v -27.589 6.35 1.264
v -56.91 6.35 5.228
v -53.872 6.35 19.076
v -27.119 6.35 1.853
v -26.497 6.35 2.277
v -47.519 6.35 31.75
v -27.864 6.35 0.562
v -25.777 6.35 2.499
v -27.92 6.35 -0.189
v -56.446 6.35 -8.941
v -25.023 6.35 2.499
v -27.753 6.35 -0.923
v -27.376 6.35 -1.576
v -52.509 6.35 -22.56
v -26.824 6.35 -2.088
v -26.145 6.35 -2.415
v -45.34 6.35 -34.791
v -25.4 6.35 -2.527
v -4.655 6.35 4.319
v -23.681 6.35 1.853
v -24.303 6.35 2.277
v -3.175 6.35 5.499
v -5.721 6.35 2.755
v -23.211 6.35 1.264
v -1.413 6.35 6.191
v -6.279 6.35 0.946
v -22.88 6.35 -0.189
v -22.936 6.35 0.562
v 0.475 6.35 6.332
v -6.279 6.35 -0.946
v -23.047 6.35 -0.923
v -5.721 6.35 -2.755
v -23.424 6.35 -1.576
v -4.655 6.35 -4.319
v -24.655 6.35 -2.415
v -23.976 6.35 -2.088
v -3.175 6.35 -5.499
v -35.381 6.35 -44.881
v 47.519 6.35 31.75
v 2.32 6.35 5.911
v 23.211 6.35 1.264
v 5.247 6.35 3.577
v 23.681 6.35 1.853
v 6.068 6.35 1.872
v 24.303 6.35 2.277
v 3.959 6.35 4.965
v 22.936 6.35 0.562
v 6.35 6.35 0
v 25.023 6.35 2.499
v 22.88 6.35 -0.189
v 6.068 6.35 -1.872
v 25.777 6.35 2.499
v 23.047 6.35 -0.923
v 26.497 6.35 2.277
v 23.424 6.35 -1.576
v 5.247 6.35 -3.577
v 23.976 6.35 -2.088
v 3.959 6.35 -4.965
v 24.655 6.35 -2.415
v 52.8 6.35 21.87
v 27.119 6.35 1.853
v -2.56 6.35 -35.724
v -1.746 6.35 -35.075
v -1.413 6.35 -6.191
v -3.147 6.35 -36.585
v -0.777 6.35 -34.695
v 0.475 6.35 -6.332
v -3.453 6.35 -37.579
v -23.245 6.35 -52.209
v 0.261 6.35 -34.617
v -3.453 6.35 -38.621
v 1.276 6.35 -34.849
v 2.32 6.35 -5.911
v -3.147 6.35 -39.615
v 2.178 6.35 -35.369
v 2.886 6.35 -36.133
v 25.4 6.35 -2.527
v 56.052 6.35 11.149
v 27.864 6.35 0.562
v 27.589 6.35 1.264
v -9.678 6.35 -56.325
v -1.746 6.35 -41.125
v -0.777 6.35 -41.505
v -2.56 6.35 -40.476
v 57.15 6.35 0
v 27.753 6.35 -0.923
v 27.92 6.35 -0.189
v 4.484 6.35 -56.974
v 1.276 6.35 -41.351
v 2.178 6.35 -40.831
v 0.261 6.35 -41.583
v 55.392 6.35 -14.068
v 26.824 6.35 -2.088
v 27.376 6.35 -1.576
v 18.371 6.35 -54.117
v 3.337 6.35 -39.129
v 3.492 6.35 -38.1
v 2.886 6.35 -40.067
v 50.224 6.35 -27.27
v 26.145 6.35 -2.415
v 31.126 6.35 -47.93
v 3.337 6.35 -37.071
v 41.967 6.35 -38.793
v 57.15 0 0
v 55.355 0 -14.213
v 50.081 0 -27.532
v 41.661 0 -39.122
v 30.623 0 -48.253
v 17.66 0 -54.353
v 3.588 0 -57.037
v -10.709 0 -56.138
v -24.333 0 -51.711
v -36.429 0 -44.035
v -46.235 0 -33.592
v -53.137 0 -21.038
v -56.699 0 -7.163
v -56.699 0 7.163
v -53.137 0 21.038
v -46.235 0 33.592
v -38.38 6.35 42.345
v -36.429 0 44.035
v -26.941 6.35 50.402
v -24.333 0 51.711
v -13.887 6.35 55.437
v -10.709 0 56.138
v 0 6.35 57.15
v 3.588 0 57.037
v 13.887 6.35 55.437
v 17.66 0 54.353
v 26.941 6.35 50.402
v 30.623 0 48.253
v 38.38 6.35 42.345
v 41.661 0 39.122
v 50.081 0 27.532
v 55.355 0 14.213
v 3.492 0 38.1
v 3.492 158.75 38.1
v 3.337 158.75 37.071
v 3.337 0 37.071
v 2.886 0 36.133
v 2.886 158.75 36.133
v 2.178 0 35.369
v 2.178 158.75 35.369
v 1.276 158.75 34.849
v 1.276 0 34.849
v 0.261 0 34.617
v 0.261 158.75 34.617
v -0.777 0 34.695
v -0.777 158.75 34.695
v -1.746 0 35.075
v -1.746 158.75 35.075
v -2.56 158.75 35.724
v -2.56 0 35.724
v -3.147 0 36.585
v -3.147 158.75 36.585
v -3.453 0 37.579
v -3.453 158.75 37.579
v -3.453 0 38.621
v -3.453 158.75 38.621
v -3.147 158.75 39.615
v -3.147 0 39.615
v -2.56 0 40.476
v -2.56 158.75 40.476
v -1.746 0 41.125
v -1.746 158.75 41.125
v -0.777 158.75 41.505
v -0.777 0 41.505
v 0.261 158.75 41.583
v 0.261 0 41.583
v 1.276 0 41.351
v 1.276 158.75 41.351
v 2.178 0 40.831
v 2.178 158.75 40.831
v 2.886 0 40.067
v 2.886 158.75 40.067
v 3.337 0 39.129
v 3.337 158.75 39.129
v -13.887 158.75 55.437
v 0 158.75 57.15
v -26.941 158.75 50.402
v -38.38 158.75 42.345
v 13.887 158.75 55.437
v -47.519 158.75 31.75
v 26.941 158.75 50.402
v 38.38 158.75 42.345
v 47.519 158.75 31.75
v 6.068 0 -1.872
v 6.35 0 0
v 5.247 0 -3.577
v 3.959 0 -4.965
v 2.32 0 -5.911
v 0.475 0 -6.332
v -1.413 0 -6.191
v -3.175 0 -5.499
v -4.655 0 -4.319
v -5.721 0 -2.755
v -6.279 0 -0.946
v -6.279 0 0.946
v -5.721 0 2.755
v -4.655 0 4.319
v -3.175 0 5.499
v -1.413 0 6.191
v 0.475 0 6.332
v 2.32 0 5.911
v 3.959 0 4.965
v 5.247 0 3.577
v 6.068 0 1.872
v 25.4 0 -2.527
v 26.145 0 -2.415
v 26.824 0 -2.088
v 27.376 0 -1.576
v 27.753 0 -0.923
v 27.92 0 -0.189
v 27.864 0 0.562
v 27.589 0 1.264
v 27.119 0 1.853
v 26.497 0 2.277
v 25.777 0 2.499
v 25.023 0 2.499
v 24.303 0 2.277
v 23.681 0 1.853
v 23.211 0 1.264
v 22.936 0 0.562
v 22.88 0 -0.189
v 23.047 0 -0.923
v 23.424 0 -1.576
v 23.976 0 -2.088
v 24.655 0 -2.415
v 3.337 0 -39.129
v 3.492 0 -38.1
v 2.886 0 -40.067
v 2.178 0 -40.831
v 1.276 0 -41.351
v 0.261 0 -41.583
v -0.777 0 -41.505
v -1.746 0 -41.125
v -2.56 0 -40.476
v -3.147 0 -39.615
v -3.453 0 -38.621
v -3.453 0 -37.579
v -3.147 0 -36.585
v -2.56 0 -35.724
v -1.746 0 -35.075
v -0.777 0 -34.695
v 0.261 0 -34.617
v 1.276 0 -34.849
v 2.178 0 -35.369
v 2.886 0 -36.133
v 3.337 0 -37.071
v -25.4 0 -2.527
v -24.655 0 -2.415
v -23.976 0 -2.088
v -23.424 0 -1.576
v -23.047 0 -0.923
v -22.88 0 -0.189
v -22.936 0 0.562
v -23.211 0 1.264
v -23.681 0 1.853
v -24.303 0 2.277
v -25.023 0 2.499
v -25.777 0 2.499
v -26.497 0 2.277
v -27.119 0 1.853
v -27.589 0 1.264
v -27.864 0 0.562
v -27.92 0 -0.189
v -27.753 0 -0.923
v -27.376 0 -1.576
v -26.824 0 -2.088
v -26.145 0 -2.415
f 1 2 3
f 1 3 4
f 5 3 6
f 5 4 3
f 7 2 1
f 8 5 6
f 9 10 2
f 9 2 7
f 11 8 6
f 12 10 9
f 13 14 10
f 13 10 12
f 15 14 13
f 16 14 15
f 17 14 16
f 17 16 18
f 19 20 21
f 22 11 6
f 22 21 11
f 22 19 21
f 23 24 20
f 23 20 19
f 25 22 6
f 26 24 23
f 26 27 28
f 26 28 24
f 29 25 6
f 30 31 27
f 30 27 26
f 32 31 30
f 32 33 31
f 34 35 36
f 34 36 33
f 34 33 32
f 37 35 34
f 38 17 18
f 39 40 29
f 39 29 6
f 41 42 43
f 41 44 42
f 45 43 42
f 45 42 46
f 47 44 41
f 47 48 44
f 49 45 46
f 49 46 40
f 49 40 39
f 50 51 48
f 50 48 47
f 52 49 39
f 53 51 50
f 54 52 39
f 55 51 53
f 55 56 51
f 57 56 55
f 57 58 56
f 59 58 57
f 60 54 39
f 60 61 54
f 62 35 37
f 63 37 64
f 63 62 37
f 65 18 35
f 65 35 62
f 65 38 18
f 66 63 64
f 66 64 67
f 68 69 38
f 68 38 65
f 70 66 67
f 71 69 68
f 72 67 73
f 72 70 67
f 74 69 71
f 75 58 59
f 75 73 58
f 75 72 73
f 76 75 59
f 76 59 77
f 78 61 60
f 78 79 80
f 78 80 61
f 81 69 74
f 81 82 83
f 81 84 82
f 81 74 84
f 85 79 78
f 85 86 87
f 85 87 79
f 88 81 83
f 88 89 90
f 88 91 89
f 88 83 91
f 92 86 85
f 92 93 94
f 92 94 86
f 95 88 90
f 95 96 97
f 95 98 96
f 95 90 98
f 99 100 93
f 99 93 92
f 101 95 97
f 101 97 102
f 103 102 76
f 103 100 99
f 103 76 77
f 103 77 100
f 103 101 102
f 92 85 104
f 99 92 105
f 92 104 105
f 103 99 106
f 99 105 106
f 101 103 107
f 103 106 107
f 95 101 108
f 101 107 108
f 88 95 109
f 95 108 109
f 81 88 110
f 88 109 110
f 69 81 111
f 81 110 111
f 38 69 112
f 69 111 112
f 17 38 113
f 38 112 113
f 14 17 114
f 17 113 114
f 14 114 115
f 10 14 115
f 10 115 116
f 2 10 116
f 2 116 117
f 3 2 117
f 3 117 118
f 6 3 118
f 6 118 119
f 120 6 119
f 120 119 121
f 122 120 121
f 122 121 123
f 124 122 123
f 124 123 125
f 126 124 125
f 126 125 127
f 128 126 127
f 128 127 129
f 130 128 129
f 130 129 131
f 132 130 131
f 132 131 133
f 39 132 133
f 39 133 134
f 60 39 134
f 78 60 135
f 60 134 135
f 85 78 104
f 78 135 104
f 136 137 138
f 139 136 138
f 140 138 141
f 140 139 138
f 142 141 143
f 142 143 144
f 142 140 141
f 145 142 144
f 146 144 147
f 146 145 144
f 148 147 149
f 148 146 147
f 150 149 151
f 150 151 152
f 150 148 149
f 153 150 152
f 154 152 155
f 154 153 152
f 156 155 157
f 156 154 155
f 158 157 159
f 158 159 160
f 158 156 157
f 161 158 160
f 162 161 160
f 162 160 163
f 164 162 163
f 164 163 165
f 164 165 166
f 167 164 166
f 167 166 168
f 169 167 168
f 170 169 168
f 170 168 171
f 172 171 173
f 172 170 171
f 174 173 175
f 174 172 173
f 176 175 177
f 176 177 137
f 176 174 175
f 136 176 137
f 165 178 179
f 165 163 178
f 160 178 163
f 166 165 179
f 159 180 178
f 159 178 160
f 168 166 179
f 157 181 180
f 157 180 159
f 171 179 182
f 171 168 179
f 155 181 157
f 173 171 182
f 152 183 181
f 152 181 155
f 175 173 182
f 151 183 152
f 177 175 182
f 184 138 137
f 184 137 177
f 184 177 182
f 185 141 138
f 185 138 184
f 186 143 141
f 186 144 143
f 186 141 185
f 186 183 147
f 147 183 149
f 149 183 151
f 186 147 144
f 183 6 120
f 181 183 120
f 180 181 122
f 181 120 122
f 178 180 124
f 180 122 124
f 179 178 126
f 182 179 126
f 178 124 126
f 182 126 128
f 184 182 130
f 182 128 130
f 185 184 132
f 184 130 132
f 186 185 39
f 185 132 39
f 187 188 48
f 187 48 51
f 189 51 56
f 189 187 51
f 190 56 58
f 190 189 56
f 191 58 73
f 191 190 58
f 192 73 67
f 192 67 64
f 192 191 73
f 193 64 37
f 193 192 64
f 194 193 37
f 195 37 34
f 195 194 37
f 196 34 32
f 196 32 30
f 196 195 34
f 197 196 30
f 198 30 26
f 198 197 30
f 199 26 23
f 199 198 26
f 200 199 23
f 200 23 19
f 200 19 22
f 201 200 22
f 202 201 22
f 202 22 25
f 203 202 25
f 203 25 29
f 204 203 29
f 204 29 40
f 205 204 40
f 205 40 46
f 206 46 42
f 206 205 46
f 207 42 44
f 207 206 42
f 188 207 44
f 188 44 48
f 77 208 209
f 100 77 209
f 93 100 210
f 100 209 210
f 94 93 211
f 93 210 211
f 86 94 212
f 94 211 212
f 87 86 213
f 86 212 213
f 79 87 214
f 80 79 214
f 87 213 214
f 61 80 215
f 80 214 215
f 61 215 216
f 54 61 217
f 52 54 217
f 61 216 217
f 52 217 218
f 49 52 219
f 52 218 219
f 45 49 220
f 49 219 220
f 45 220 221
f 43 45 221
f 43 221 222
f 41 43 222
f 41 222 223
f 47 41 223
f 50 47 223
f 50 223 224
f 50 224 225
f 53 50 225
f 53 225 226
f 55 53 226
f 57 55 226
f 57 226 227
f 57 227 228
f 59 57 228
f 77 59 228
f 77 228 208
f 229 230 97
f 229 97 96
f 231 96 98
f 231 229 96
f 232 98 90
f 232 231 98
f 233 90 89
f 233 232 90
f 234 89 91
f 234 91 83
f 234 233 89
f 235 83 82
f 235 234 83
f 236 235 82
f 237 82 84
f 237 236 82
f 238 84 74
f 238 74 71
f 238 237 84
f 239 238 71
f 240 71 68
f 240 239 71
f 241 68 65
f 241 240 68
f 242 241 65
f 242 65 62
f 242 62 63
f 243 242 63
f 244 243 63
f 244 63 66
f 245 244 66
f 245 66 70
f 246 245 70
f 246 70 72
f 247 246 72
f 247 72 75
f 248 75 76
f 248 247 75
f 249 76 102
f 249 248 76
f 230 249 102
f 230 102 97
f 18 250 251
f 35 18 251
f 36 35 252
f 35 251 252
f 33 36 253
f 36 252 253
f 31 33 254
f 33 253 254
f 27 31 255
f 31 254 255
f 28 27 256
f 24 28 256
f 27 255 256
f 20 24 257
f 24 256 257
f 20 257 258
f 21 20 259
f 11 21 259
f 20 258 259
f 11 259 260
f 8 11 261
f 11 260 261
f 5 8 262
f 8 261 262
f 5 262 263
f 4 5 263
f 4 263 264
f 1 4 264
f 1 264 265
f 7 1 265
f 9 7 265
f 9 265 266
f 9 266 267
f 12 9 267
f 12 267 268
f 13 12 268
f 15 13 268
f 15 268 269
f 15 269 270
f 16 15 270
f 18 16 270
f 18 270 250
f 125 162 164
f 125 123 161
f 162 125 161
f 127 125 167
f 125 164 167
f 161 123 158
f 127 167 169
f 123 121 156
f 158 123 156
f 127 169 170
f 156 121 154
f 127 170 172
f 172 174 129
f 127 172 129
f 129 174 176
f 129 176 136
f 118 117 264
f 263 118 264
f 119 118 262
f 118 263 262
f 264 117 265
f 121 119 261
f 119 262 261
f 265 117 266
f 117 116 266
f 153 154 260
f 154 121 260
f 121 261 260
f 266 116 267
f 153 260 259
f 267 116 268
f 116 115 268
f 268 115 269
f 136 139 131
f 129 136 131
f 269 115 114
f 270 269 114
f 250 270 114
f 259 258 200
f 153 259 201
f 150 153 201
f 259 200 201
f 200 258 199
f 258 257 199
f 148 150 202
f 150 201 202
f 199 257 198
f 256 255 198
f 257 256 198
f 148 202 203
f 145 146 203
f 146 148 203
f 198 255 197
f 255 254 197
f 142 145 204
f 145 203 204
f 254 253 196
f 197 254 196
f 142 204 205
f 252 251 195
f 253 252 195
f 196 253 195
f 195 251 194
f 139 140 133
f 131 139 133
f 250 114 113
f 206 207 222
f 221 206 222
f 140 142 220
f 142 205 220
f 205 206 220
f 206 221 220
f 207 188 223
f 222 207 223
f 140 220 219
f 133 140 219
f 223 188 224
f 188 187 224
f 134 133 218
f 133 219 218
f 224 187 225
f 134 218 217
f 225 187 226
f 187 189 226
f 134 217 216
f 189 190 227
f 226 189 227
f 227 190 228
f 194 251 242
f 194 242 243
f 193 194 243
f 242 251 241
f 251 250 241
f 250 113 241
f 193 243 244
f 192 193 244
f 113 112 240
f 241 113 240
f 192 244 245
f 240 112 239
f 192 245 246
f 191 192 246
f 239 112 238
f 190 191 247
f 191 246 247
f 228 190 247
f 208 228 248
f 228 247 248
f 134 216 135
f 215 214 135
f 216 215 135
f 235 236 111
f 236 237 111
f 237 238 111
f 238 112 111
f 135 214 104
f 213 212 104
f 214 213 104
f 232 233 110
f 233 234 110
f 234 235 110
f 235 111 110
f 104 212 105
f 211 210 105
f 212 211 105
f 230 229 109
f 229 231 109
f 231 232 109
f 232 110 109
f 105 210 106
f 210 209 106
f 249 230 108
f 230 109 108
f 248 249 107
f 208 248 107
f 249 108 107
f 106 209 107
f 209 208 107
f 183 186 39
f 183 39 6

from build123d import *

# Parameters (mm, degrees)
SKETCH1_R                  = 57.15
SKETCH1_R_2                = 6.35
SKETCH1_R_3                = 3.4925
BOSS_EXTRUDE1_DEPTH        = 6.35
F_8_0_199_DIAMETER_HOLE1_D = 5.0546
SKETCH6_R                  = 3.4925
BOSS_EXTRUDE3_DEPTH        = 152.4


with BuildPart() as part:
    # Sketch1 → Boss-Extrude1 (new body)
    with BuildSketch(Plane(origin=(0, 0, 0), x_dir=(1, 0, 0), z_dir=(0, 1, 0))):
        Circle(SKETCH1_R)
        Circle(SKETCH1_R_2, mode=Mode.SUBTRACT)
        with Locations((0, 38.1)):
            Circle(SKETCH1_R_3, mode=Mode.SUBTRACT)
        with Locations((0, -38.1)):
            Circle(SKETCH1_R_3, mode=Mode.SUBTRACT)
    extrude(amount=BOSS_EXTRUDE1_DEPTH)

    # #8 (0.199) Diameter Hole1 (through all)
    with Locations(Plane(origin=(-25.4, 6.35, 0), x_dir=(0, 0, 1), z_dir=(0, 1, 0))):
        with Locations((0, 0), (0, 50.8)):
            Hole(F_8_0_199_DIAMETER_HOLE1_D / 2)

    # Sketch6 → Boss-Extrude3 (add)
    with BuildSketch(Plane(origin=(0, 6.35, 0), x_dir=(1, 0, 0), z_dir=(0, 1, 0))):
        with BuildLine():
            Line((47.519048812, -31.75), (-47.519048812, -31.75))
            ThreePointArc((-47.519048812, -31.75), (0, -57.15), (47.519048812, -31.75))
        make_face()
        with Locations((0, -38.1)):
            Circle(SKETCH6_R, mode=Mode.SUBTRACT)
    extrude(amount=BOSS_EXTRUDE3_DEPTH)


solid = part.part
